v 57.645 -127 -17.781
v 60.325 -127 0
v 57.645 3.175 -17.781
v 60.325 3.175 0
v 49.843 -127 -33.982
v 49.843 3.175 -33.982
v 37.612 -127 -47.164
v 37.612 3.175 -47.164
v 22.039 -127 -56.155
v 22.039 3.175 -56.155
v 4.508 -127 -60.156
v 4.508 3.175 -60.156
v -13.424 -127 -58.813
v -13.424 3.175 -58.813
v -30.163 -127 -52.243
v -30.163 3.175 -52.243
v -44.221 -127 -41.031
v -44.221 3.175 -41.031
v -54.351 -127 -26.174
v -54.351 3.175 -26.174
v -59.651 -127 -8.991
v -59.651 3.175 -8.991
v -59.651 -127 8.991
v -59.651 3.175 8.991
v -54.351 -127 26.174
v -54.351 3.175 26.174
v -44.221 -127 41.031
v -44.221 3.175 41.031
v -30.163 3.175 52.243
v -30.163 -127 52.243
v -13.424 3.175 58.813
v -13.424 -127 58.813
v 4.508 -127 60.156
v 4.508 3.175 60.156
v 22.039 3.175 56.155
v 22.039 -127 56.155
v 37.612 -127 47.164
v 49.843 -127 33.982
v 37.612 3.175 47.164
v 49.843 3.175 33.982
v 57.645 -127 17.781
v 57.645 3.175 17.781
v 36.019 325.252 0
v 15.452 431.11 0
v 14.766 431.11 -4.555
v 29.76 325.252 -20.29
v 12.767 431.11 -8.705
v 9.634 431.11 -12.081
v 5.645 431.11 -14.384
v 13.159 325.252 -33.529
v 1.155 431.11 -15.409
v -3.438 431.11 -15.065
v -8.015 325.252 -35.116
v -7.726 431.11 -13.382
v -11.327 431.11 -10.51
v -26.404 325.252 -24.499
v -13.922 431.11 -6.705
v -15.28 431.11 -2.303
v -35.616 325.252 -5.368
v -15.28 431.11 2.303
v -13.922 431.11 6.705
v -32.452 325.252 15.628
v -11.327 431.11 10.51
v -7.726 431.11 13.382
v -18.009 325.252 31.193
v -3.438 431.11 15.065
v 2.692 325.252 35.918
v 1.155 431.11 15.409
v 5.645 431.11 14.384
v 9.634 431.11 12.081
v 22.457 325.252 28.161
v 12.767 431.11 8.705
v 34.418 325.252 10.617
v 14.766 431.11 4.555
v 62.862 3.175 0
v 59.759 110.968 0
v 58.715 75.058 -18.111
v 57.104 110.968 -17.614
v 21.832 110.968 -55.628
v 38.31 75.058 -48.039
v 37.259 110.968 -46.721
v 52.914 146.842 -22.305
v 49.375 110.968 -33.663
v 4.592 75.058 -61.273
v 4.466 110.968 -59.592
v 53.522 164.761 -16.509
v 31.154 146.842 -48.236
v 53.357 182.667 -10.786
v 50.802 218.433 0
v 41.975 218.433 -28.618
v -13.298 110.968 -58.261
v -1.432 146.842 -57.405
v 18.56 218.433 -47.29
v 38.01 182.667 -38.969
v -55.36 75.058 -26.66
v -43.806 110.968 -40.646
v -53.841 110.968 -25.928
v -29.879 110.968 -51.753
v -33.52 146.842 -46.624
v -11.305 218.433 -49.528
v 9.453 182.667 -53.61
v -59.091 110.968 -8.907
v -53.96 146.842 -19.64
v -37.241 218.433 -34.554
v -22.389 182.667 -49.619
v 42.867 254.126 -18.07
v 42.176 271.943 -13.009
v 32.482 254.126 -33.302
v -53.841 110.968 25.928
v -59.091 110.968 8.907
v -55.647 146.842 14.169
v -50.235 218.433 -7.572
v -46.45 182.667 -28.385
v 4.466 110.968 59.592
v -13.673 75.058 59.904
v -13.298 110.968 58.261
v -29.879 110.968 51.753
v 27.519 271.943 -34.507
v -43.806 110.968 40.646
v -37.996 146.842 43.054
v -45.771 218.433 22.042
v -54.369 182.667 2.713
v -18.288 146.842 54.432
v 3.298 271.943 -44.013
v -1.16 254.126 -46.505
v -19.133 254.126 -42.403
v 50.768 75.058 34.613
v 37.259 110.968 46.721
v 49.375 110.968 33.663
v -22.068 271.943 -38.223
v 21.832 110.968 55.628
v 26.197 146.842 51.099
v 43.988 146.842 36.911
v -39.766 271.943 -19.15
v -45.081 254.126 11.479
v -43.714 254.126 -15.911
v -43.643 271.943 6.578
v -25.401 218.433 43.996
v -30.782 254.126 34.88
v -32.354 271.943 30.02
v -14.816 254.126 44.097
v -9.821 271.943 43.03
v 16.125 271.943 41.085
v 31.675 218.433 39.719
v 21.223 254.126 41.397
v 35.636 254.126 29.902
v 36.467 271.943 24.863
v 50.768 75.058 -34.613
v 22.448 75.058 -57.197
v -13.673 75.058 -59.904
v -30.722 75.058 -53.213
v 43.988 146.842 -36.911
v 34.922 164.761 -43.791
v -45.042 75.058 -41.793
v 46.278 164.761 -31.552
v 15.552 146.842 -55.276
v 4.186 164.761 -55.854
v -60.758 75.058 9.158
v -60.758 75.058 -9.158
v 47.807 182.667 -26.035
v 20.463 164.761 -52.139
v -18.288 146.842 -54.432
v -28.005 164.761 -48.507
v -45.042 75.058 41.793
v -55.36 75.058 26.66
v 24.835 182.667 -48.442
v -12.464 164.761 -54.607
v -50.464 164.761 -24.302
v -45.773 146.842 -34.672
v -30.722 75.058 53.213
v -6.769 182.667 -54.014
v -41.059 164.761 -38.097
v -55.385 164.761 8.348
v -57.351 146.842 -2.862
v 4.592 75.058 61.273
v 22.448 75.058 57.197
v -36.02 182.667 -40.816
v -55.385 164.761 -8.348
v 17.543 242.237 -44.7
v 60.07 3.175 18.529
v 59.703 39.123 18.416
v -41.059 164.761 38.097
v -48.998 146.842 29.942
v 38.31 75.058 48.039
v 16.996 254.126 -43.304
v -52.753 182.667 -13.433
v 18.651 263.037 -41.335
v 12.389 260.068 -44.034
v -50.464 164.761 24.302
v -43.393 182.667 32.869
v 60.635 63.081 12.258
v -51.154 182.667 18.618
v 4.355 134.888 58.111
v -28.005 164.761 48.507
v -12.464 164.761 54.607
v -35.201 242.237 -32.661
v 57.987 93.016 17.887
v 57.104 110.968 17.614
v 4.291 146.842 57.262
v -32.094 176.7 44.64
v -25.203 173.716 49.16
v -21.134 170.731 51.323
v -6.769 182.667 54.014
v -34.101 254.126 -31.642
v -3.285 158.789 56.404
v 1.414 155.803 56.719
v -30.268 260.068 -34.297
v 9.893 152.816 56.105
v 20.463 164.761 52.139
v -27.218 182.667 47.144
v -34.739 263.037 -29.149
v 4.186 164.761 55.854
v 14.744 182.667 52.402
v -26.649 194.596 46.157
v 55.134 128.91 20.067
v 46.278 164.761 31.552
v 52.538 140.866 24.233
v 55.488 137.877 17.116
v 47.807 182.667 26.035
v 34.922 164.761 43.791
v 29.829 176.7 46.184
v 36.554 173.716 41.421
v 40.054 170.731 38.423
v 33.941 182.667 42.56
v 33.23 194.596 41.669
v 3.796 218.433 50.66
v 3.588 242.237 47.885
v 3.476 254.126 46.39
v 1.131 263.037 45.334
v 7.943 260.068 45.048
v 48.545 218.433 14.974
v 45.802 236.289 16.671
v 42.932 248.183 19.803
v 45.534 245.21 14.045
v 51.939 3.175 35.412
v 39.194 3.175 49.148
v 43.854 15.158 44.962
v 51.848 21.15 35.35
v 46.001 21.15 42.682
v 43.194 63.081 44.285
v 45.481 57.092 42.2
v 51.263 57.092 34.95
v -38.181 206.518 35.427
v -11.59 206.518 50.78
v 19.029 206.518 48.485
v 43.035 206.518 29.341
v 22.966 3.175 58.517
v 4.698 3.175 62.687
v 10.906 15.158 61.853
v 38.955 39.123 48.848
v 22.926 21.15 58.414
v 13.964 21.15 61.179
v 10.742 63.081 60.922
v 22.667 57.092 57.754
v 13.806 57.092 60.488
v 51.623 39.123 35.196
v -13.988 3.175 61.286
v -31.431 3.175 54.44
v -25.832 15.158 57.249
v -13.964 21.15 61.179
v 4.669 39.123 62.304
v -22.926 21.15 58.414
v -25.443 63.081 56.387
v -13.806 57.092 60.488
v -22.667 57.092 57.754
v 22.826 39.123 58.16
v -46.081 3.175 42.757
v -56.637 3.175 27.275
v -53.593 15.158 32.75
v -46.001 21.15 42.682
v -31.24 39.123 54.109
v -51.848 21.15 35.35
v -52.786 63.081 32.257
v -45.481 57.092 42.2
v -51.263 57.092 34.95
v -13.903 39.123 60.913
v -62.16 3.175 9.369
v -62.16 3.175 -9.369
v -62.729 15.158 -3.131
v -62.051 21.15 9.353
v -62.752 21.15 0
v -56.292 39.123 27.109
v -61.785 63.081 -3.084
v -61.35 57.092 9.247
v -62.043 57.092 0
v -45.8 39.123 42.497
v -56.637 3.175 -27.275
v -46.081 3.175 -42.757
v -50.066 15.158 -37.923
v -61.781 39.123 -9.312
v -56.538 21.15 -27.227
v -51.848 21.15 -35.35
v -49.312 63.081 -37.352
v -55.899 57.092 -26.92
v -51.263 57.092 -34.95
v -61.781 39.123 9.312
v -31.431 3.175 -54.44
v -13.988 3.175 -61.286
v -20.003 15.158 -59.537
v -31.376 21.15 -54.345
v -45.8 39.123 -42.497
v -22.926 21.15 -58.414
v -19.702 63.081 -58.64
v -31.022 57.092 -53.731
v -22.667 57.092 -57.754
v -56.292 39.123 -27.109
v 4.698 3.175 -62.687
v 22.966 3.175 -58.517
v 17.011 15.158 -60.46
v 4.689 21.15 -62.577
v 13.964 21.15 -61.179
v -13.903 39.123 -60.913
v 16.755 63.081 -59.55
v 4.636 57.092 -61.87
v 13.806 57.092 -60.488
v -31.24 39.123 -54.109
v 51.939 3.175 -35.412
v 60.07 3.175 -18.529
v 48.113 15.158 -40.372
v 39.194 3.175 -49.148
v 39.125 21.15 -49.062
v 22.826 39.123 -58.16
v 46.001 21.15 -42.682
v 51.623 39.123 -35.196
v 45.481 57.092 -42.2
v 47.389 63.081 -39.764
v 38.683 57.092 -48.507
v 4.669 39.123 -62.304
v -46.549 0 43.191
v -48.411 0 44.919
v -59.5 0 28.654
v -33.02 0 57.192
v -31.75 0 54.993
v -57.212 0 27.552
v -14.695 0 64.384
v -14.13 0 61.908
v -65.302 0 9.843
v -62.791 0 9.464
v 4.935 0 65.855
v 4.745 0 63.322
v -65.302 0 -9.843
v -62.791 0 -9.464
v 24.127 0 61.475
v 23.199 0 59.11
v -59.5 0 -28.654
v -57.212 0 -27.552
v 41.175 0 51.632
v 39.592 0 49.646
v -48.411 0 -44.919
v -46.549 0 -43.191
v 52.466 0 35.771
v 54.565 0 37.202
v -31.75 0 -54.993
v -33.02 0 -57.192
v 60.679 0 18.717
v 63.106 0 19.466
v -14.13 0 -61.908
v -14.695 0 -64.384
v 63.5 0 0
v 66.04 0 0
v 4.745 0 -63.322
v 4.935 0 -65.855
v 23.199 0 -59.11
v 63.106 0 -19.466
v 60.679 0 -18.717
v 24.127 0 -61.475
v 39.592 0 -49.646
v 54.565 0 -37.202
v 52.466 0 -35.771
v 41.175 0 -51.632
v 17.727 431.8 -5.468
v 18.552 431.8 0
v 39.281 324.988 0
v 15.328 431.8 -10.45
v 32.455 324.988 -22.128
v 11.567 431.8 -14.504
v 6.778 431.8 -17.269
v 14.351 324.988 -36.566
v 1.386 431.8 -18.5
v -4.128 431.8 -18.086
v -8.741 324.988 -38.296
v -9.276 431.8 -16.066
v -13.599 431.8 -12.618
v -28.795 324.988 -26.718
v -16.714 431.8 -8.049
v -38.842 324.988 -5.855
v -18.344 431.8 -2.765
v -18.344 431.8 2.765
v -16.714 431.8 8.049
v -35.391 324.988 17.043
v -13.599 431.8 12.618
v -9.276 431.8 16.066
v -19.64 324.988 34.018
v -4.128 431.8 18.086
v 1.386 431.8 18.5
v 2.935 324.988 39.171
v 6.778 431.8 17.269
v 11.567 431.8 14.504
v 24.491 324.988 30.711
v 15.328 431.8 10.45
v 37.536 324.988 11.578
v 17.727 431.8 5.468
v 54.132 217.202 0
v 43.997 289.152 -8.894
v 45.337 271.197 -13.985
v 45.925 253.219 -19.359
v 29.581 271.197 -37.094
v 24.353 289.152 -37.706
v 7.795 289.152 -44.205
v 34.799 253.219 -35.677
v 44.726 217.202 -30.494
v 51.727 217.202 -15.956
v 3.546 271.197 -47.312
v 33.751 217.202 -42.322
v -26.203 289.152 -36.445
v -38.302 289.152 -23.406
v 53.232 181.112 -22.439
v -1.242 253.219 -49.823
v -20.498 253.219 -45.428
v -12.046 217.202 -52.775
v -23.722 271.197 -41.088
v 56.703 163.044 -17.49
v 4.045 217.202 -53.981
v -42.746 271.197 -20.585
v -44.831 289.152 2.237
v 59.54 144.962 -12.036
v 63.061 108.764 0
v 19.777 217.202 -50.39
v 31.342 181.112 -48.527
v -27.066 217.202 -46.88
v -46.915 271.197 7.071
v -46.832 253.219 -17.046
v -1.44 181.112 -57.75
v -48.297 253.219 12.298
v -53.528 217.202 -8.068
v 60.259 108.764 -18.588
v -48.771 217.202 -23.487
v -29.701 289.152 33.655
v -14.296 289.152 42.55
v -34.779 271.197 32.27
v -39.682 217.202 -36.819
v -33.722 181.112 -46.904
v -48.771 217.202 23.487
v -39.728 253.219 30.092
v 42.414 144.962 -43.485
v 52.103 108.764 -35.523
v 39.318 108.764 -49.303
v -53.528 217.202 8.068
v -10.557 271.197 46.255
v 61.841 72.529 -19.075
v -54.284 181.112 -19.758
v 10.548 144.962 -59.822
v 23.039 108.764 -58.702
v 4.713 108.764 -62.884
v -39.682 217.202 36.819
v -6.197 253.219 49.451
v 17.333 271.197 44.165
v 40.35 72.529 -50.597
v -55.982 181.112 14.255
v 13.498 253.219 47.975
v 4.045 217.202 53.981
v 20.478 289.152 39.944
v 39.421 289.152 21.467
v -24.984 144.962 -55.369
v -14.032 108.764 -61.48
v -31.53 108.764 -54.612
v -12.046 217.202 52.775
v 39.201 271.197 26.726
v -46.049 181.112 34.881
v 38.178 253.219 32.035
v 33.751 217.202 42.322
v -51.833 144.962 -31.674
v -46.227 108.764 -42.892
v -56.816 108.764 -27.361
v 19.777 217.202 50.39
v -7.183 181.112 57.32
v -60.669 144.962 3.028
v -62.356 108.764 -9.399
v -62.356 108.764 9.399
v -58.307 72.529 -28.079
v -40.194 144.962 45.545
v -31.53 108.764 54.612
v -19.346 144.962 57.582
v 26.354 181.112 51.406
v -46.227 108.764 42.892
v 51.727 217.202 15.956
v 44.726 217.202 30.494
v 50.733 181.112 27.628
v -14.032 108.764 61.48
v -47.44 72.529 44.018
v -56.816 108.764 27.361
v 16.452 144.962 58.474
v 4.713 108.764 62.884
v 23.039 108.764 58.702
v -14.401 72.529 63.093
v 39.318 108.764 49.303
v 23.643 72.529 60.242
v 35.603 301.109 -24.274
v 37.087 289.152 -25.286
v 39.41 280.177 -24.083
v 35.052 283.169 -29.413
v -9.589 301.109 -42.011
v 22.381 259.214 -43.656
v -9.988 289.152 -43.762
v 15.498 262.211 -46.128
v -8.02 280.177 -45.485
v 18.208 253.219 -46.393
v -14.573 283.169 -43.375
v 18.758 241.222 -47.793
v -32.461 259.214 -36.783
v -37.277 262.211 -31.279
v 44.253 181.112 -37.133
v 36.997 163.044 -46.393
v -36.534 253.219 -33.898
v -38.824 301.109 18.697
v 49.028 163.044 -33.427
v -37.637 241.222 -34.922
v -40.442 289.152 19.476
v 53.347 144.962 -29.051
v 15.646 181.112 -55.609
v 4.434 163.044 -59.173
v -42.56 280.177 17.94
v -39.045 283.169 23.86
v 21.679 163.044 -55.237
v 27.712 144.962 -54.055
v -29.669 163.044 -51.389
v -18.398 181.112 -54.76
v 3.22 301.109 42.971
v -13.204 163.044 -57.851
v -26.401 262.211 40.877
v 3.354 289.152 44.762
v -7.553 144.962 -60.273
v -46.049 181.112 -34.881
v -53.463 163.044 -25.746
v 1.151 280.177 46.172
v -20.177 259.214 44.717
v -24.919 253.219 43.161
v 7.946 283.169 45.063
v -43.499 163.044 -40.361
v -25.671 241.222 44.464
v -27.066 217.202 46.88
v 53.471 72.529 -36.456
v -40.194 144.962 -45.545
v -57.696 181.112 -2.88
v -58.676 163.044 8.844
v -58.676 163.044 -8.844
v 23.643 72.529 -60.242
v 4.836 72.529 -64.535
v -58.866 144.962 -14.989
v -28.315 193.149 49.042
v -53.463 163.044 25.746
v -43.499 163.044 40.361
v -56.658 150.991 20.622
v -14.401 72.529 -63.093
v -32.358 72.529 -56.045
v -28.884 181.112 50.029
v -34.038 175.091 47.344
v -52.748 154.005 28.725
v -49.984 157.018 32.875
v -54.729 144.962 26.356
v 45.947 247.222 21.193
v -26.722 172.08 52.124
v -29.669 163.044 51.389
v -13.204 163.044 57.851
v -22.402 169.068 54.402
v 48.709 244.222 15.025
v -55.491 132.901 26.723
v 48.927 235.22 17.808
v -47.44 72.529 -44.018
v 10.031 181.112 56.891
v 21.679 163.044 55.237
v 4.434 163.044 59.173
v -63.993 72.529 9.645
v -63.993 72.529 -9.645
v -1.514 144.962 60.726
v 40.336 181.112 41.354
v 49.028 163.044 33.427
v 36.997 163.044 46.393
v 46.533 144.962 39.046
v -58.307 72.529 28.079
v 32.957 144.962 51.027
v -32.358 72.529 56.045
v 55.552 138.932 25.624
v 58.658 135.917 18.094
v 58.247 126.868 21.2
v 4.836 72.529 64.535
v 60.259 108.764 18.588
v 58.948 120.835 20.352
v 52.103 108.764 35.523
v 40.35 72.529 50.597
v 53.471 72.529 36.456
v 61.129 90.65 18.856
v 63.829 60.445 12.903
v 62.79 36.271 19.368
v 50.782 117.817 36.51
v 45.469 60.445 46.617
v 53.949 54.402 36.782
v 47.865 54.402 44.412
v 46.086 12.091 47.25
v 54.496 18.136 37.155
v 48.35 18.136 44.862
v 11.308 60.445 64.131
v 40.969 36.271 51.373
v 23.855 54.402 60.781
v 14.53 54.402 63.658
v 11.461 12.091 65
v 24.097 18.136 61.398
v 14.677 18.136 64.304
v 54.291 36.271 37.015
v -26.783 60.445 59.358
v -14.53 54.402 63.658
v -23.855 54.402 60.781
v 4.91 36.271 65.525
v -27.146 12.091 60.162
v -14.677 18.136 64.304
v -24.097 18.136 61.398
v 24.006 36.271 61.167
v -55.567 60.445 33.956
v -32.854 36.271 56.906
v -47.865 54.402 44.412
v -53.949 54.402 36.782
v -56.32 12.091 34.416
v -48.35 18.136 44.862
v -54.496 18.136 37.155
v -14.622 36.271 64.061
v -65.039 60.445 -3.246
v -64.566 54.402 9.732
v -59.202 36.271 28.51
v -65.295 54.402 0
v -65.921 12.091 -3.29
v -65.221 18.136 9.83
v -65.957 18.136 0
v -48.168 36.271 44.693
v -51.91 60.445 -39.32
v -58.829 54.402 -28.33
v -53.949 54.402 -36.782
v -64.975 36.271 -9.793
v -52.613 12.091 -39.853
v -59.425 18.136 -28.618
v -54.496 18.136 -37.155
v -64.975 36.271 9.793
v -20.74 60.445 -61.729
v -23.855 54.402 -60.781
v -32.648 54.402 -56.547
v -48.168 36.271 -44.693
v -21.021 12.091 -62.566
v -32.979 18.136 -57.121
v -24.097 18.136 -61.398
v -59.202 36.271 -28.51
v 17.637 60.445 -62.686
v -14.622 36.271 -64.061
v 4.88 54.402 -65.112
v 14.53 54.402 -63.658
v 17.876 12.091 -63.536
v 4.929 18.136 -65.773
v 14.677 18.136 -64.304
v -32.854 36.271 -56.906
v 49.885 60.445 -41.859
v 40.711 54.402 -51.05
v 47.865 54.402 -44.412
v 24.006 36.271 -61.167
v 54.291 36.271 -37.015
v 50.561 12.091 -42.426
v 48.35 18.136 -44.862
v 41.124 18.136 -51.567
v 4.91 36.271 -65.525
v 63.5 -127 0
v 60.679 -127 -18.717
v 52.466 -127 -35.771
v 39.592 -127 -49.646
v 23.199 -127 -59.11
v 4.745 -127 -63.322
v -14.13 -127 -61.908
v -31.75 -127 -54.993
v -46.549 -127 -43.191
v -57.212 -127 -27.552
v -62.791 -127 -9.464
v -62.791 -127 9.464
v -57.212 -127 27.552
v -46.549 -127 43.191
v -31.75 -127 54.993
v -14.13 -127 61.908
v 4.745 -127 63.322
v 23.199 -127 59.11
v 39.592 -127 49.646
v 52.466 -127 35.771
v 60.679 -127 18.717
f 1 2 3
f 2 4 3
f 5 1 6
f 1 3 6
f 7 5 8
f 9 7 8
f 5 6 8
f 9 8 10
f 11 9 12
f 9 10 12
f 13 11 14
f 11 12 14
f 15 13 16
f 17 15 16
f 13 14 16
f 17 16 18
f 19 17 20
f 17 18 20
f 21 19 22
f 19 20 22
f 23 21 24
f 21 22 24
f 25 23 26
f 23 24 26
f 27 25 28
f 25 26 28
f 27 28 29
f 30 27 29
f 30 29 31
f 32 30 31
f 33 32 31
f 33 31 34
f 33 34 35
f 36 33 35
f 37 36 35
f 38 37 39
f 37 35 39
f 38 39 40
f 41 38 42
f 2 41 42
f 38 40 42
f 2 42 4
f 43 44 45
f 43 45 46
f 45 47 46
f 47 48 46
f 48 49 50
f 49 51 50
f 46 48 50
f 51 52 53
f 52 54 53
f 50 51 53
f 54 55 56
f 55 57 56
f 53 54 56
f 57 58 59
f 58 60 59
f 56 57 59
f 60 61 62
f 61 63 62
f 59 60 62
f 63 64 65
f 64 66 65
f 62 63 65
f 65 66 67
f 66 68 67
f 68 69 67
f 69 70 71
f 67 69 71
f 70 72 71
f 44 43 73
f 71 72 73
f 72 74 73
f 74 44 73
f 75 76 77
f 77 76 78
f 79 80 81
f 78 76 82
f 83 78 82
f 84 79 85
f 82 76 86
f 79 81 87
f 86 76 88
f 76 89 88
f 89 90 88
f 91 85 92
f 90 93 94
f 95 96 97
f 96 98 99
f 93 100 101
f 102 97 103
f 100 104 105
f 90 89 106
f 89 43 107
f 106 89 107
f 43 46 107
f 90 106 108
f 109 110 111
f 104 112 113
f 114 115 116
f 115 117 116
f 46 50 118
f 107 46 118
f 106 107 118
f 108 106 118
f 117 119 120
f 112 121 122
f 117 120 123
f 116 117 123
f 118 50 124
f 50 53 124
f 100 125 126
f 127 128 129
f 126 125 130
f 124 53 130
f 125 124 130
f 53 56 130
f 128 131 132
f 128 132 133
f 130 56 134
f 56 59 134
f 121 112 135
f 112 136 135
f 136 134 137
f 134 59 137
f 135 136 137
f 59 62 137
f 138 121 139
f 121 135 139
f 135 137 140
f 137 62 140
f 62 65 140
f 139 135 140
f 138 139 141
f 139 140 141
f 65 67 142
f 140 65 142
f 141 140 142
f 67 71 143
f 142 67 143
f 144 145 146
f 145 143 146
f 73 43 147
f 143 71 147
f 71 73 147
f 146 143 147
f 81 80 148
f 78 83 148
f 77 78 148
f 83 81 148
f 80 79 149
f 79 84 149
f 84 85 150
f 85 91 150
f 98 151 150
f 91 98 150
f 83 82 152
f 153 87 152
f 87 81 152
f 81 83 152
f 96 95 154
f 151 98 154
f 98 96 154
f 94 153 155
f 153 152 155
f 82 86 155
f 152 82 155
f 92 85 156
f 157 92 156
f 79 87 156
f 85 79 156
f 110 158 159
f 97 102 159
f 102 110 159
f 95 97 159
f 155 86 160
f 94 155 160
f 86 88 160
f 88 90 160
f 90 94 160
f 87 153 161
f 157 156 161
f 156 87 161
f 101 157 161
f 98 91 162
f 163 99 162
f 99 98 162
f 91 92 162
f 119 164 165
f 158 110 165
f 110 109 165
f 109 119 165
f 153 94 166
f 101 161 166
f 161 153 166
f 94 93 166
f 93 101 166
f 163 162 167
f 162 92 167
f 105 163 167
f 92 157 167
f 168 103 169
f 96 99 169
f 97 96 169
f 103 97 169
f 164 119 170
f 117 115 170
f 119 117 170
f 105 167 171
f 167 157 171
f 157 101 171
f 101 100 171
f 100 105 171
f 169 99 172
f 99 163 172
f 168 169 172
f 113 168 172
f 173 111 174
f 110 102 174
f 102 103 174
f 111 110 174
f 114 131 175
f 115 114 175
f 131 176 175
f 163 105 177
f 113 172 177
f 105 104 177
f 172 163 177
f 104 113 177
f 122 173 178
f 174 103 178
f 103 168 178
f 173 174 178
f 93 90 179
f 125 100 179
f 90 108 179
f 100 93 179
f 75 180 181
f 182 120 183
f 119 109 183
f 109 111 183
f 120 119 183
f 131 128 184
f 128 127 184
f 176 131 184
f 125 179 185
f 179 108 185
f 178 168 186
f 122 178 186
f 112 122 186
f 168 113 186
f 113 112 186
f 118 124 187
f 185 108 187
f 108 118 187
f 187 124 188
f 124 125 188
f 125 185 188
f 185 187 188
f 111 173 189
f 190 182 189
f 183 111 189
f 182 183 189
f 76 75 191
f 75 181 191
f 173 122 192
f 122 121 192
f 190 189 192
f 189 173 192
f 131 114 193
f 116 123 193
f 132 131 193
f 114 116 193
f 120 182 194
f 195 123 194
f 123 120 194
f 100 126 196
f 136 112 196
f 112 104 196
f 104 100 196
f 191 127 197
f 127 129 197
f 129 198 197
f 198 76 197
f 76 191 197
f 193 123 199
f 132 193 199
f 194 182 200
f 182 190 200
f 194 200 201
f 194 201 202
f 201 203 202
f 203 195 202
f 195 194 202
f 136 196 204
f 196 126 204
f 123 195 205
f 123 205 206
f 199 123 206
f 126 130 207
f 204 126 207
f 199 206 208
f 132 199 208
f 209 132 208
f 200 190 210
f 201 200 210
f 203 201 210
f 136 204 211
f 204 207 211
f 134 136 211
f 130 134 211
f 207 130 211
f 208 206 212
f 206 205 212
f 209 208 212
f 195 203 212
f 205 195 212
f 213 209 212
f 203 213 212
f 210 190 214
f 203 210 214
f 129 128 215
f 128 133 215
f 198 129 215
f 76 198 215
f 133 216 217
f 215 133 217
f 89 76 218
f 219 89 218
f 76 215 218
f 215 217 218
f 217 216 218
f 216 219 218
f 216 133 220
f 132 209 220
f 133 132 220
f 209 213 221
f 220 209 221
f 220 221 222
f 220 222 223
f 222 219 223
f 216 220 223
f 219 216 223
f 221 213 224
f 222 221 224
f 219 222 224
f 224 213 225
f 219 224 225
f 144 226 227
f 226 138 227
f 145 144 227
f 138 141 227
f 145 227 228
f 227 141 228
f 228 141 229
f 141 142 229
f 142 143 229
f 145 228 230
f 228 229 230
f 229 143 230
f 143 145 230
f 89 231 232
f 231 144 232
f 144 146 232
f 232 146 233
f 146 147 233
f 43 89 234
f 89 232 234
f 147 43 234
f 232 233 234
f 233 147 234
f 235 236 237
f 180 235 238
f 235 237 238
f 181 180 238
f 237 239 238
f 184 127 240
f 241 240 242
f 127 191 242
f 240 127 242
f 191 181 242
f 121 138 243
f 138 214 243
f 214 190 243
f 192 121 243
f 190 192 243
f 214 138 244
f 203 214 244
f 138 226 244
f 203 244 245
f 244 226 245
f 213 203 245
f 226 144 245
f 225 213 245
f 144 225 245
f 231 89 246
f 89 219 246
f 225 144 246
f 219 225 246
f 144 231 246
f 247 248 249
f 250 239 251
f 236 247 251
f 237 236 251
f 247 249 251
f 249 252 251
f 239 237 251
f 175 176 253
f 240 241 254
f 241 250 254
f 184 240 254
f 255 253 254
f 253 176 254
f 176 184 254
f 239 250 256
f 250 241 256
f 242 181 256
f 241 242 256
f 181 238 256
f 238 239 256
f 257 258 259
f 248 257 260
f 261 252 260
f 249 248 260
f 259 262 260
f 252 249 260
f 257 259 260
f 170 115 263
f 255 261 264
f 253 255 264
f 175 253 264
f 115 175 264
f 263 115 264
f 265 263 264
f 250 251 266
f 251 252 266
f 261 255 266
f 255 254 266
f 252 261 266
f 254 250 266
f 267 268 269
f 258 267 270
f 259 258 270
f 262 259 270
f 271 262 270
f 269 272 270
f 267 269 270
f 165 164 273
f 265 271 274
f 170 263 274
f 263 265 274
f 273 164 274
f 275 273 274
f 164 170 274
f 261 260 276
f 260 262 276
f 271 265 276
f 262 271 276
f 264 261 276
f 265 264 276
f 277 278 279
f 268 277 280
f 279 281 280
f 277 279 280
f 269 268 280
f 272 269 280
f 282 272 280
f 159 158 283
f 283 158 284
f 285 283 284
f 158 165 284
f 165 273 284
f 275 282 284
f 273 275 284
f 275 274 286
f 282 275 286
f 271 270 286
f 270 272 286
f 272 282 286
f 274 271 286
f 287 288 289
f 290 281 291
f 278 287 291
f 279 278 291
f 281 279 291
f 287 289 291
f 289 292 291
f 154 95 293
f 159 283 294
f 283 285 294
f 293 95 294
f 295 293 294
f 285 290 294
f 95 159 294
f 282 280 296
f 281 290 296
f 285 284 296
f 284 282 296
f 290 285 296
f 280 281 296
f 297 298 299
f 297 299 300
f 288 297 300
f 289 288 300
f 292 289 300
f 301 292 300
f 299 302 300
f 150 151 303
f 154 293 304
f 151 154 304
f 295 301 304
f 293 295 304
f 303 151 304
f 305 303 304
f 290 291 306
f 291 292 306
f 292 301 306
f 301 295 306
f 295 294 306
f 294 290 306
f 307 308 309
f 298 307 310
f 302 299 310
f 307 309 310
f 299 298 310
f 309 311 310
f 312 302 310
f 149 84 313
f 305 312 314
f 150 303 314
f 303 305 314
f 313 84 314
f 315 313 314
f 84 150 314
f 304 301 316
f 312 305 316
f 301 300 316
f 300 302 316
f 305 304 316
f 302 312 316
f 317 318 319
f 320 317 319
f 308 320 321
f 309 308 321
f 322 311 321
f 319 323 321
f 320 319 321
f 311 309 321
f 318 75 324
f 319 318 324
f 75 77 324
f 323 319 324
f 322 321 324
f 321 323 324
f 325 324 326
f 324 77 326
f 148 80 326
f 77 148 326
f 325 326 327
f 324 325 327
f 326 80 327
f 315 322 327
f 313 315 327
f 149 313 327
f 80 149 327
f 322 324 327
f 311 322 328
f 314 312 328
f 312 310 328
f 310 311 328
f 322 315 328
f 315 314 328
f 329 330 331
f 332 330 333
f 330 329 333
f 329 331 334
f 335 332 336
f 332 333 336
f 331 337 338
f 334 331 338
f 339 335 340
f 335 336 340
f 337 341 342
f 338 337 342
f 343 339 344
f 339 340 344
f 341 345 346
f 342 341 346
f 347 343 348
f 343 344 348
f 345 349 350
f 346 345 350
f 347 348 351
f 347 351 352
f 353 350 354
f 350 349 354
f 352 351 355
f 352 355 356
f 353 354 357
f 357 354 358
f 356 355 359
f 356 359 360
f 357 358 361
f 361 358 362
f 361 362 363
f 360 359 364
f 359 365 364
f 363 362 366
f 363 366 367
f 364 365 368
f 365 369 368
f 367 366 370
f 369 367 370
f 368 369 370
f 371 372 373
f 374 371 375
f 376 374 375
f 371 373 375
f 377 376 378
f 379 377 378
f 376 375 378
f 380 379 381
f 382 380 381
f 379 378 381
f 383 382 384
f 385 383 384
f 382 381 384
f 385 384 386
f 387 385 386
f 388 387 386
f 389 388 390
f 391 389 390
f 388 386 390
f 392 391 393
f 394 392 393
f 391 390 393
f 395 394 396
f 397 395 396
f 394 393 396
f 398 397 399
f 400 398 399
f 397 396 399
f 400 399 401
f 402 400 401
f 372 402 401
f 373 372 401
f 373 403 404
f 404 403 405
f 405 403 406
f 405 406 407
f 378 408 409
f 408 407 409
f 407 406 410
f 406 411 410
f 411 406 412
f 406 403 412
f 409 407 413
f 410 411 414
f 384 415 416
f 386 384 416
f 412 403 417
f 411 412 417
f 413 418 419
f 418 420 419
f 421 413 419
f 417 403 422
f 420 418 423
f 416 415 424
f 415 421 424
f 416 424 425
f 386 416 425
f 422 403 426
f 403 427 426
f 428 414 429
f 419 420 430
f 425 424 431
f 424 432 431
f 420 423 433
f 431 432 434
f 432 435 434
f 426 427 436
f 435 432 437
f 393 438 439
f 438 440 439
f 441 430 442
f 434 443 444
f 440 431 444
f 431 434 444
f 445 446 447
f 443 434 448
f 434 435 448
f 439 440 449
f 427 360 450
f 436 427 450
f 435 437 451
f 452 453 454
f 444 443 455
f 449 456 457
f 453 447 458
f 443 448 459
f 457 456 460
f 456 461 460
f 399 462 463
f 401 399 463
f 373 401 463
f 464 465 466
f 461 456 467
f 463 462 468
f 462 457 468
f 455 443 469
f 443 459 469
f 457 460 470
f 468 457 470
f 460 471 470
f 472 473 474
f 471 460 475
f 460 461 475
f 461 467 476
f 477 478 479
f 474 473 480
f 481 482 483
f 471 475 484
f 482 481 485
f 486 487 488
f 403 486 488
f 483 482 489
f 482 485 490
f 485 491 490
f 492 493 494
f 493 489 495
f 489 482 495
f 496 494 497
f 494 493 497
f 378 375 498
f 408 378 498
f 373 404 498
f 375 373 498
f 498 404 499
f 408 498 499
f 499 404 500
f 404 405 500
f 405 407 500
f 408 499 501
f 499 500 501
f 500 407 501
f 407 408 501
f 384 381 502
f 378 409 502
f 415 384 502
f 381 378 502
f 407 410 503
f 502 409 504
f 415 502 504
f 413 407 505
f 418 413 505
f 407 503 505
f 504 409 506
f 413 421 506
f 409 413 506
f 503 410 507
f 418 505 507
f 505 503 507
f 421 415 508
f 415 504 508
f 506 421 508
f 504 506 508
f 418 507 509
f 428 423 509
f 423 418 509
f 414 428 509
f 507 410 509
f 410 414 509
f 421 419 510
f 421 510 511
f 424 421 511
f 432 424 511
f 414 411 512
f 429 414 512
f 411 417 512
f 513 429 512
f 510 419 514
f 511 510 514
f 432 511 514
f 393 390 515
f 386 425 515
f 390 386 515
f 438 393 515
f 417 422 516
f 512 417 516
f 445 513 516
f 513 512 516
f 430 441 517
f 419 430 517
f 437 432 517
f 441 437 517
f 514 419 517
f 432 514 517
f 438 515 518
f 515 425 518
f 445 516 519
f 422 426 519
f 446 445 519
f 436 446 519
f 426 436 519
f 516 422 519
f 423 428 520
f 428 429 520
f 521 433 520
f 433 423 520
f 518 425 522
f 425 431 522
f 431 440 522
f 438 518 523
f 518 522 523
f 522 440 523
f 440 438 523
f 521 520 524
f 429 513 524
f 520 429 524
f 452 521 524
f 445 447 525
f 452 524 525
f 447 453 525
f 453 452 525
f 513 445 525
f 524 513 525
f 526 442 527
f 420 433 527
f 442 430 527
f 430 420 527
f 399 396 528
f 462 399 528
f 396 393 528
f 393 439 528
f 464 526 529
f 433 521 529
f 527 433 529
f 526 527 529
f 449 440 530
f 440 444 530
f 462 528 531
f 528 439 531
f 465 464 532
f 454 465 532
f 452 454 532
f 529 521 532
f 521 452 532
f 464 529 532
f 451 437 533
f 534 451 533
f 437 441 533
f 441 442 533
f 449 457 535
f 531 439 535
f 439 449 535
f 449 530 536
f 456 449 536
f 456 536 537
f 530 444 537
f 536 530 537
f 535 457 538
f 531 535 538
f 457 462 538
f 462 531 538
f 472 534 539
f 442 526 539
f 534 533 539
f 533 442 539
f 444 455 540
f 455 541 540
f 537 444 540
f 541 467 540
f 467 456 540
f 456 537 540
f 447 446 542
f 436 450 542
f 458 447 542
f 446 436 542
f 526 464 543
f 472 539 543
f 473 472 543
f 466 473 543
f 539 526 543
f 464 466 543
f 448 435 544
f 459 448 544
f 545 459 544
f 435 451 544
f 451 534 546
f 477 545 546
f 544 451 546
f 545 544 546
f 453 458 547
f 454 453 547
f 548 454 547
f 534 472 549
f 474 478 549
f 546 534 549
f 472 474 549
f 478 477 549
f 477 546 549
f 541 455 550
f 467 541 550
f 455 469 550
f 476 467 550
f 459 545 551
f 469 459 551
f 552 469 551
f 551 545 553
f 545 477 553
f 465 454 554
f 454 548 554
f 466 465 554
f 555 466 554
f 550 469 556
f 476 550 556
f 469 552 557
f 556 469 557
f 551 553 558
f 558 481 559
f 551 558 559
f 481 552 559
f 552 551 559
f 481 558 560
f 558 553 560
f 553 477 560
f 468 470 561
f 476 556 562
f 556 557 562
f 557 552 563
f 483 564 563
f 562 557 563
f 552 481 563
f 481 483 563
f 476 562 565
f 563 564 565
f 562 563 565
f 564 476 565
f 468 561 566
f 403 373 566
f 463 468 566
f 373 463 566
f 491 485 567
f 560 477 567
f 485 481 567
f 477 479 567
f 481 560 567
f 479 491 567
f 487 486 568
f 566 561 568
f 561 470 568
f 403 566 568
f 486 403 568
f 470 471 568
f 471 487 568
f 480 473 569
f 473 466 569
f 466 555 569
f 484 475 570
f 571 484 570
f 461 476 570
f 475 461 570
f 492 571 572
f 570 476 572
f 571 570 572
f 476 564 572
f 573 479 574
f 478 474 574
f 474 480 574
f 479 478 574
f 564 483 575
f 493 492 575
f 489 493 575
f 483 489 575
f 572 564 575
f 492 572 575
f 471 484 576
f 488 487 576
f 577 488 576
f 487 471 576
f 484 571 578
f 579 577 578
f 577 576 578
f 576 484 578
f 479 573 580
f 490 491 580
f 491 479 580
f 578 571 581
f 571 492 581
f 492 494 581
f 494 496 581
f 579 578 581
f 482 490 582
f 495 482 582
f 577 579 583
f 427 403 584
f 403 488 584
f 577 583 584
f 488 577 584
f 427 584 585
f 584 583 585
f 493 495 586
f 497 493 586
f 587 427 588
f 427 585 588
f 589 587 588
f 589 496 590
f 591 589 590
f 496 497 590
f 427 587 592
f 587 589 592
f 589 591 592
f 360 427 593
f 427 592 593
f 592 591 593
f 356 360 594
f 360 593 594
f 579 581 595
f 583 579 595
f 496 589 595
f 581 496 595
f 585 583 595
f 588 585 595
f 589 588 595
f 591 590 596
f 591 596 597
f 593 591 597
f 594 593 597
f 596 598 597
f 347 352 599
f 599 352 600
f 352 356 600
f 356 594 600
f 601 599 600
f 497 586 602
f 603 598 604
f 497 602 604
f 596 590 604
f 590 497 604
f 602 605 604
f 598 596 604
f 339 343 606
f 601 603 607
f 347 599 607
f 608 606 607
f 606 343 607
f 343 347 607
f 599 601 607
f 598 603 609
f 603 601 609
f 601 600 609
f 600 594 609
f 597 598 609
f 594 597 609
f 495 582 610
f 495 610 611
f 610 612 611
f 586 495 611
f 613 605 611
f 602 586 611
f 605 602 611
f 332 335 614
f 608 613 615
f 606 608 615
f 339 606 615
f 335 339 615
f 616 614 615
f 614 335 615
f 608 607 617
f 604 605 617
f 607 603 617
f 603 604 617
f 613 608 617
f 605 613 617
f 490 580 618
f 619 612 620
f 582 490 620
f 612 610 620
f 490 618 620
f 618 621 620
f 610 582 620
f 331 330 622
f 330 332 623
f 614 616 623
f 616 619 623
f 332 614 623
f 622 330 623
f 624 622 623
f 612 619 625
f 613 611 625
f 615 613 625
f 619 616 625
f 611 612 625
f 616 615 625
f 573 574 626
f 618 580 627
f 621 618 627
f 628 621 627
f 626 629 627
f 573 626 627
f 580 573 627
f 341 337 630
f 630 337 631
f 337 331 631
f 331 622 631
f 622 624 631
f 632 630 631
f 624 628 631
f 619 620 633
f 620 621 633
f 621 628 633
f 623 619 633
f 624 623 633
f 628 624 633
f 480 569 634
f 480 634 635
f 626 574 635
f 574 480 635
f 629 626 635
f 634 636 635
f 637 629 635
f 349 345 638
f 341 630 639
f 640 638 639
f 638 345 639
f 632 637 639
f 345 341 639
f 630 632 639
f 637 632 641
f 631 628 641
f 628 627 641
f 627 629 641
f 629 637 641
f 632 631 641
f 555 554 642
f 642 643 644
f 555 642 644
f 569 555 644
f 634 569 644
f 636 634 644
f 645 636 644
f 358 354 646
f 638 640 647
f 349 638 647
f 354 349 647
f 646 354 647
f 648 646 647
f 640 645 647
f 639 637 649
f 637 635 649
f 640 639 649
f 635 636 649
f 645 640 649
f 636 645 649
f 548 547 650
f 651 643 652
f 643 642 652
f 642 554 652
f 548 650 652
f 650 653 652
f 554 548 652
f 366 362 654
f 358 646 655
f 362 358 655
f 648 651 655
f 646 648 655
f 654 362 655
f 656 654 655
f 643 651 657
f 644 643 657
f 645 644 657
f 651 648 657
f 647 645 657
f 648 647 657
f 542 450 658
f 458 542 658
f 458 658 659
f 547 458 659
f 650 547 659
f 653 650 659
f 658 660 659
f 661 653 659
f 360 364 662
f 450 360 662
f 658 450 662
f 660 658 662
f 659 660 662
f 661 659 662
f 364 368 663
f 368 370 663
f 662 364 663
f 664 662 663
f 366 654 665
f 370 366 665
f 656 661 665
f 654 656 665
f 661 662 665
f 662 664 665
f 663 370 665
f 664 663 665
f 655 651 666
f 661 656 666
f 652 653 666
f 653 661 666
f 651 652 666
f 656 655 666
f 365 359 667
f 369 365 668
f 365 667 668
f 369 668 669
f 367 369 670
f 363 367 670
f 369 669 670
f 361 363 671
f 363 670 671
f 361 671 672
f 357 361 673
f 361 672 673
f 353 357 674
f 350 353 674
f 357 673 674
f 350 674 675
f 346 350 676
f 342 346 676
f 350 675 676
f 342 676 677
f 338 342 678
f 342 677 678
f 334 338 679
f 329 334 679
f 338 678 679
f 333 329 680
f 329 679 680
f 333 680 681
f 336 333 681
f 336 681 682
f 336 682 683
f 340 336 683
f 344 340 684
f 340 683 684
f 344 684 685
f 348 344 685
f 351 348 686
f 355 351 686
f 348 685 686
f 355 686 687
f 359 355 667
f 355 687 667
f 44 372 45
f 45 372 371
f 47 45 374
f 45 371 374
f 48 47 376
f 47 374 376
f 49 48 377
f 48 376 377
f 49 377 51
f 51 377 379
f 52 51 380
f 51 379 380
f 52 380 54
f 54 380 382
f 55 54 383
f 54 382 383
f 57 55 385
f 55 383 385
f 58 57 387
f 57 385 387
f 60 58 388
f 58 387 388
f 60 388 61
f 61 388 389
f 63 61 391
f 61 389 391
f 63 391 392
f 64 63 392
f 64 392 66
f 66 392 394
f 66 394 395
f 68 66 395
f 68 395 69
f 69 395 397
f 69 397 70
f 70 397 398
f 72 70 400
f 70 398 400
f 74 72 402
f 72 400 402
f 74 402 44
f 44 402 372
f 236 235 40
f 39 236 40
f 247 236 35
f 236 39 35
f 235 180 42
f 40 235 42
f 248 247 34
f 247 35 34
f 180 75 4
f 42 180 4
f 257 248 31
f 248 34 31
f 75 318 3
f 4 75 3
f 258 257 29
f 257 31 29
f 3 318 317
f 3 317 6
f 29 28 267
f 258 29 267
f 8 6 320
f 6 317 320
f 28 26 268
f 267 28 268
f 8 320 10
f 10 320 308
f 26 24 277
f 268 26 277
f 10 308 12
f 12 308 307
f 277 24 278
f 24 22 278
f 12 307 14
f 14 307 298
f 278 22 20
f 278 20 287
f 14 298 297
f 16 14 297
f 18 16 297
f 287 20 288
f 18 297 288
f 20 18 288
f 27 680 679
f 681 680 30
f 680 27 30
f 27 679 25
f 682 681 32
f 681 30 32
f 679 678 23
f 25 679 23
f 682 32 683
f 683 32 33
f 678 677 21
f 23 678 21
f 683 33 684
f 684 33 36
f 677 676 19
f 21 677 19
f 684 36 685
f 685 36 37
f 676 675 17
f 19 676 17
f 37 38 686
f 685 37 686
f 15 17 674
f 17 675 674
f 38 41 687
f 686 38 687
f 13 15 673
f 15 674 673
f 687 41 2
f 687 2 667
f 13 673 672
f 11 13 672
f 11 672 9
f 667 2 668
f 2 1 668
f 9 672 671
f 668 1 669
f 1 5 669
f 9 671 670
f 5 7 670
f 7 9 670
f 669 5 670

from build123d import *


with BuildPart() as part:
    # Sketch1 → Revolve-Thin3 (revolve)
    with BuildSketch(Plane.XY):
        with BuildLine():
            ThreePointArc((18.551548743, 431.8), (54.132203955, 217.201745506), (66.04, 0))
            Line((66.04, 0), (63.5, 0))
            Line((63.5, 0), (63.5, -127))
            Line((63.5, -127), (60.325, -127))
            Line((60.325, -127), (60.325, 3.175))
            Line((60.325, 3.175), (62.862459123, 3.175))
            ThreePointArc((62.862459123, 3.175), (50.80205754, 218.432575212), (15.452434998, 431.109986233))
            Line((15.452434998, 431.109986233), (18.551548743, 431.8))
        make_face()
    revolve(axis=Axis((0, 0, 0), (0, 1, 0)))


solid = part.part
